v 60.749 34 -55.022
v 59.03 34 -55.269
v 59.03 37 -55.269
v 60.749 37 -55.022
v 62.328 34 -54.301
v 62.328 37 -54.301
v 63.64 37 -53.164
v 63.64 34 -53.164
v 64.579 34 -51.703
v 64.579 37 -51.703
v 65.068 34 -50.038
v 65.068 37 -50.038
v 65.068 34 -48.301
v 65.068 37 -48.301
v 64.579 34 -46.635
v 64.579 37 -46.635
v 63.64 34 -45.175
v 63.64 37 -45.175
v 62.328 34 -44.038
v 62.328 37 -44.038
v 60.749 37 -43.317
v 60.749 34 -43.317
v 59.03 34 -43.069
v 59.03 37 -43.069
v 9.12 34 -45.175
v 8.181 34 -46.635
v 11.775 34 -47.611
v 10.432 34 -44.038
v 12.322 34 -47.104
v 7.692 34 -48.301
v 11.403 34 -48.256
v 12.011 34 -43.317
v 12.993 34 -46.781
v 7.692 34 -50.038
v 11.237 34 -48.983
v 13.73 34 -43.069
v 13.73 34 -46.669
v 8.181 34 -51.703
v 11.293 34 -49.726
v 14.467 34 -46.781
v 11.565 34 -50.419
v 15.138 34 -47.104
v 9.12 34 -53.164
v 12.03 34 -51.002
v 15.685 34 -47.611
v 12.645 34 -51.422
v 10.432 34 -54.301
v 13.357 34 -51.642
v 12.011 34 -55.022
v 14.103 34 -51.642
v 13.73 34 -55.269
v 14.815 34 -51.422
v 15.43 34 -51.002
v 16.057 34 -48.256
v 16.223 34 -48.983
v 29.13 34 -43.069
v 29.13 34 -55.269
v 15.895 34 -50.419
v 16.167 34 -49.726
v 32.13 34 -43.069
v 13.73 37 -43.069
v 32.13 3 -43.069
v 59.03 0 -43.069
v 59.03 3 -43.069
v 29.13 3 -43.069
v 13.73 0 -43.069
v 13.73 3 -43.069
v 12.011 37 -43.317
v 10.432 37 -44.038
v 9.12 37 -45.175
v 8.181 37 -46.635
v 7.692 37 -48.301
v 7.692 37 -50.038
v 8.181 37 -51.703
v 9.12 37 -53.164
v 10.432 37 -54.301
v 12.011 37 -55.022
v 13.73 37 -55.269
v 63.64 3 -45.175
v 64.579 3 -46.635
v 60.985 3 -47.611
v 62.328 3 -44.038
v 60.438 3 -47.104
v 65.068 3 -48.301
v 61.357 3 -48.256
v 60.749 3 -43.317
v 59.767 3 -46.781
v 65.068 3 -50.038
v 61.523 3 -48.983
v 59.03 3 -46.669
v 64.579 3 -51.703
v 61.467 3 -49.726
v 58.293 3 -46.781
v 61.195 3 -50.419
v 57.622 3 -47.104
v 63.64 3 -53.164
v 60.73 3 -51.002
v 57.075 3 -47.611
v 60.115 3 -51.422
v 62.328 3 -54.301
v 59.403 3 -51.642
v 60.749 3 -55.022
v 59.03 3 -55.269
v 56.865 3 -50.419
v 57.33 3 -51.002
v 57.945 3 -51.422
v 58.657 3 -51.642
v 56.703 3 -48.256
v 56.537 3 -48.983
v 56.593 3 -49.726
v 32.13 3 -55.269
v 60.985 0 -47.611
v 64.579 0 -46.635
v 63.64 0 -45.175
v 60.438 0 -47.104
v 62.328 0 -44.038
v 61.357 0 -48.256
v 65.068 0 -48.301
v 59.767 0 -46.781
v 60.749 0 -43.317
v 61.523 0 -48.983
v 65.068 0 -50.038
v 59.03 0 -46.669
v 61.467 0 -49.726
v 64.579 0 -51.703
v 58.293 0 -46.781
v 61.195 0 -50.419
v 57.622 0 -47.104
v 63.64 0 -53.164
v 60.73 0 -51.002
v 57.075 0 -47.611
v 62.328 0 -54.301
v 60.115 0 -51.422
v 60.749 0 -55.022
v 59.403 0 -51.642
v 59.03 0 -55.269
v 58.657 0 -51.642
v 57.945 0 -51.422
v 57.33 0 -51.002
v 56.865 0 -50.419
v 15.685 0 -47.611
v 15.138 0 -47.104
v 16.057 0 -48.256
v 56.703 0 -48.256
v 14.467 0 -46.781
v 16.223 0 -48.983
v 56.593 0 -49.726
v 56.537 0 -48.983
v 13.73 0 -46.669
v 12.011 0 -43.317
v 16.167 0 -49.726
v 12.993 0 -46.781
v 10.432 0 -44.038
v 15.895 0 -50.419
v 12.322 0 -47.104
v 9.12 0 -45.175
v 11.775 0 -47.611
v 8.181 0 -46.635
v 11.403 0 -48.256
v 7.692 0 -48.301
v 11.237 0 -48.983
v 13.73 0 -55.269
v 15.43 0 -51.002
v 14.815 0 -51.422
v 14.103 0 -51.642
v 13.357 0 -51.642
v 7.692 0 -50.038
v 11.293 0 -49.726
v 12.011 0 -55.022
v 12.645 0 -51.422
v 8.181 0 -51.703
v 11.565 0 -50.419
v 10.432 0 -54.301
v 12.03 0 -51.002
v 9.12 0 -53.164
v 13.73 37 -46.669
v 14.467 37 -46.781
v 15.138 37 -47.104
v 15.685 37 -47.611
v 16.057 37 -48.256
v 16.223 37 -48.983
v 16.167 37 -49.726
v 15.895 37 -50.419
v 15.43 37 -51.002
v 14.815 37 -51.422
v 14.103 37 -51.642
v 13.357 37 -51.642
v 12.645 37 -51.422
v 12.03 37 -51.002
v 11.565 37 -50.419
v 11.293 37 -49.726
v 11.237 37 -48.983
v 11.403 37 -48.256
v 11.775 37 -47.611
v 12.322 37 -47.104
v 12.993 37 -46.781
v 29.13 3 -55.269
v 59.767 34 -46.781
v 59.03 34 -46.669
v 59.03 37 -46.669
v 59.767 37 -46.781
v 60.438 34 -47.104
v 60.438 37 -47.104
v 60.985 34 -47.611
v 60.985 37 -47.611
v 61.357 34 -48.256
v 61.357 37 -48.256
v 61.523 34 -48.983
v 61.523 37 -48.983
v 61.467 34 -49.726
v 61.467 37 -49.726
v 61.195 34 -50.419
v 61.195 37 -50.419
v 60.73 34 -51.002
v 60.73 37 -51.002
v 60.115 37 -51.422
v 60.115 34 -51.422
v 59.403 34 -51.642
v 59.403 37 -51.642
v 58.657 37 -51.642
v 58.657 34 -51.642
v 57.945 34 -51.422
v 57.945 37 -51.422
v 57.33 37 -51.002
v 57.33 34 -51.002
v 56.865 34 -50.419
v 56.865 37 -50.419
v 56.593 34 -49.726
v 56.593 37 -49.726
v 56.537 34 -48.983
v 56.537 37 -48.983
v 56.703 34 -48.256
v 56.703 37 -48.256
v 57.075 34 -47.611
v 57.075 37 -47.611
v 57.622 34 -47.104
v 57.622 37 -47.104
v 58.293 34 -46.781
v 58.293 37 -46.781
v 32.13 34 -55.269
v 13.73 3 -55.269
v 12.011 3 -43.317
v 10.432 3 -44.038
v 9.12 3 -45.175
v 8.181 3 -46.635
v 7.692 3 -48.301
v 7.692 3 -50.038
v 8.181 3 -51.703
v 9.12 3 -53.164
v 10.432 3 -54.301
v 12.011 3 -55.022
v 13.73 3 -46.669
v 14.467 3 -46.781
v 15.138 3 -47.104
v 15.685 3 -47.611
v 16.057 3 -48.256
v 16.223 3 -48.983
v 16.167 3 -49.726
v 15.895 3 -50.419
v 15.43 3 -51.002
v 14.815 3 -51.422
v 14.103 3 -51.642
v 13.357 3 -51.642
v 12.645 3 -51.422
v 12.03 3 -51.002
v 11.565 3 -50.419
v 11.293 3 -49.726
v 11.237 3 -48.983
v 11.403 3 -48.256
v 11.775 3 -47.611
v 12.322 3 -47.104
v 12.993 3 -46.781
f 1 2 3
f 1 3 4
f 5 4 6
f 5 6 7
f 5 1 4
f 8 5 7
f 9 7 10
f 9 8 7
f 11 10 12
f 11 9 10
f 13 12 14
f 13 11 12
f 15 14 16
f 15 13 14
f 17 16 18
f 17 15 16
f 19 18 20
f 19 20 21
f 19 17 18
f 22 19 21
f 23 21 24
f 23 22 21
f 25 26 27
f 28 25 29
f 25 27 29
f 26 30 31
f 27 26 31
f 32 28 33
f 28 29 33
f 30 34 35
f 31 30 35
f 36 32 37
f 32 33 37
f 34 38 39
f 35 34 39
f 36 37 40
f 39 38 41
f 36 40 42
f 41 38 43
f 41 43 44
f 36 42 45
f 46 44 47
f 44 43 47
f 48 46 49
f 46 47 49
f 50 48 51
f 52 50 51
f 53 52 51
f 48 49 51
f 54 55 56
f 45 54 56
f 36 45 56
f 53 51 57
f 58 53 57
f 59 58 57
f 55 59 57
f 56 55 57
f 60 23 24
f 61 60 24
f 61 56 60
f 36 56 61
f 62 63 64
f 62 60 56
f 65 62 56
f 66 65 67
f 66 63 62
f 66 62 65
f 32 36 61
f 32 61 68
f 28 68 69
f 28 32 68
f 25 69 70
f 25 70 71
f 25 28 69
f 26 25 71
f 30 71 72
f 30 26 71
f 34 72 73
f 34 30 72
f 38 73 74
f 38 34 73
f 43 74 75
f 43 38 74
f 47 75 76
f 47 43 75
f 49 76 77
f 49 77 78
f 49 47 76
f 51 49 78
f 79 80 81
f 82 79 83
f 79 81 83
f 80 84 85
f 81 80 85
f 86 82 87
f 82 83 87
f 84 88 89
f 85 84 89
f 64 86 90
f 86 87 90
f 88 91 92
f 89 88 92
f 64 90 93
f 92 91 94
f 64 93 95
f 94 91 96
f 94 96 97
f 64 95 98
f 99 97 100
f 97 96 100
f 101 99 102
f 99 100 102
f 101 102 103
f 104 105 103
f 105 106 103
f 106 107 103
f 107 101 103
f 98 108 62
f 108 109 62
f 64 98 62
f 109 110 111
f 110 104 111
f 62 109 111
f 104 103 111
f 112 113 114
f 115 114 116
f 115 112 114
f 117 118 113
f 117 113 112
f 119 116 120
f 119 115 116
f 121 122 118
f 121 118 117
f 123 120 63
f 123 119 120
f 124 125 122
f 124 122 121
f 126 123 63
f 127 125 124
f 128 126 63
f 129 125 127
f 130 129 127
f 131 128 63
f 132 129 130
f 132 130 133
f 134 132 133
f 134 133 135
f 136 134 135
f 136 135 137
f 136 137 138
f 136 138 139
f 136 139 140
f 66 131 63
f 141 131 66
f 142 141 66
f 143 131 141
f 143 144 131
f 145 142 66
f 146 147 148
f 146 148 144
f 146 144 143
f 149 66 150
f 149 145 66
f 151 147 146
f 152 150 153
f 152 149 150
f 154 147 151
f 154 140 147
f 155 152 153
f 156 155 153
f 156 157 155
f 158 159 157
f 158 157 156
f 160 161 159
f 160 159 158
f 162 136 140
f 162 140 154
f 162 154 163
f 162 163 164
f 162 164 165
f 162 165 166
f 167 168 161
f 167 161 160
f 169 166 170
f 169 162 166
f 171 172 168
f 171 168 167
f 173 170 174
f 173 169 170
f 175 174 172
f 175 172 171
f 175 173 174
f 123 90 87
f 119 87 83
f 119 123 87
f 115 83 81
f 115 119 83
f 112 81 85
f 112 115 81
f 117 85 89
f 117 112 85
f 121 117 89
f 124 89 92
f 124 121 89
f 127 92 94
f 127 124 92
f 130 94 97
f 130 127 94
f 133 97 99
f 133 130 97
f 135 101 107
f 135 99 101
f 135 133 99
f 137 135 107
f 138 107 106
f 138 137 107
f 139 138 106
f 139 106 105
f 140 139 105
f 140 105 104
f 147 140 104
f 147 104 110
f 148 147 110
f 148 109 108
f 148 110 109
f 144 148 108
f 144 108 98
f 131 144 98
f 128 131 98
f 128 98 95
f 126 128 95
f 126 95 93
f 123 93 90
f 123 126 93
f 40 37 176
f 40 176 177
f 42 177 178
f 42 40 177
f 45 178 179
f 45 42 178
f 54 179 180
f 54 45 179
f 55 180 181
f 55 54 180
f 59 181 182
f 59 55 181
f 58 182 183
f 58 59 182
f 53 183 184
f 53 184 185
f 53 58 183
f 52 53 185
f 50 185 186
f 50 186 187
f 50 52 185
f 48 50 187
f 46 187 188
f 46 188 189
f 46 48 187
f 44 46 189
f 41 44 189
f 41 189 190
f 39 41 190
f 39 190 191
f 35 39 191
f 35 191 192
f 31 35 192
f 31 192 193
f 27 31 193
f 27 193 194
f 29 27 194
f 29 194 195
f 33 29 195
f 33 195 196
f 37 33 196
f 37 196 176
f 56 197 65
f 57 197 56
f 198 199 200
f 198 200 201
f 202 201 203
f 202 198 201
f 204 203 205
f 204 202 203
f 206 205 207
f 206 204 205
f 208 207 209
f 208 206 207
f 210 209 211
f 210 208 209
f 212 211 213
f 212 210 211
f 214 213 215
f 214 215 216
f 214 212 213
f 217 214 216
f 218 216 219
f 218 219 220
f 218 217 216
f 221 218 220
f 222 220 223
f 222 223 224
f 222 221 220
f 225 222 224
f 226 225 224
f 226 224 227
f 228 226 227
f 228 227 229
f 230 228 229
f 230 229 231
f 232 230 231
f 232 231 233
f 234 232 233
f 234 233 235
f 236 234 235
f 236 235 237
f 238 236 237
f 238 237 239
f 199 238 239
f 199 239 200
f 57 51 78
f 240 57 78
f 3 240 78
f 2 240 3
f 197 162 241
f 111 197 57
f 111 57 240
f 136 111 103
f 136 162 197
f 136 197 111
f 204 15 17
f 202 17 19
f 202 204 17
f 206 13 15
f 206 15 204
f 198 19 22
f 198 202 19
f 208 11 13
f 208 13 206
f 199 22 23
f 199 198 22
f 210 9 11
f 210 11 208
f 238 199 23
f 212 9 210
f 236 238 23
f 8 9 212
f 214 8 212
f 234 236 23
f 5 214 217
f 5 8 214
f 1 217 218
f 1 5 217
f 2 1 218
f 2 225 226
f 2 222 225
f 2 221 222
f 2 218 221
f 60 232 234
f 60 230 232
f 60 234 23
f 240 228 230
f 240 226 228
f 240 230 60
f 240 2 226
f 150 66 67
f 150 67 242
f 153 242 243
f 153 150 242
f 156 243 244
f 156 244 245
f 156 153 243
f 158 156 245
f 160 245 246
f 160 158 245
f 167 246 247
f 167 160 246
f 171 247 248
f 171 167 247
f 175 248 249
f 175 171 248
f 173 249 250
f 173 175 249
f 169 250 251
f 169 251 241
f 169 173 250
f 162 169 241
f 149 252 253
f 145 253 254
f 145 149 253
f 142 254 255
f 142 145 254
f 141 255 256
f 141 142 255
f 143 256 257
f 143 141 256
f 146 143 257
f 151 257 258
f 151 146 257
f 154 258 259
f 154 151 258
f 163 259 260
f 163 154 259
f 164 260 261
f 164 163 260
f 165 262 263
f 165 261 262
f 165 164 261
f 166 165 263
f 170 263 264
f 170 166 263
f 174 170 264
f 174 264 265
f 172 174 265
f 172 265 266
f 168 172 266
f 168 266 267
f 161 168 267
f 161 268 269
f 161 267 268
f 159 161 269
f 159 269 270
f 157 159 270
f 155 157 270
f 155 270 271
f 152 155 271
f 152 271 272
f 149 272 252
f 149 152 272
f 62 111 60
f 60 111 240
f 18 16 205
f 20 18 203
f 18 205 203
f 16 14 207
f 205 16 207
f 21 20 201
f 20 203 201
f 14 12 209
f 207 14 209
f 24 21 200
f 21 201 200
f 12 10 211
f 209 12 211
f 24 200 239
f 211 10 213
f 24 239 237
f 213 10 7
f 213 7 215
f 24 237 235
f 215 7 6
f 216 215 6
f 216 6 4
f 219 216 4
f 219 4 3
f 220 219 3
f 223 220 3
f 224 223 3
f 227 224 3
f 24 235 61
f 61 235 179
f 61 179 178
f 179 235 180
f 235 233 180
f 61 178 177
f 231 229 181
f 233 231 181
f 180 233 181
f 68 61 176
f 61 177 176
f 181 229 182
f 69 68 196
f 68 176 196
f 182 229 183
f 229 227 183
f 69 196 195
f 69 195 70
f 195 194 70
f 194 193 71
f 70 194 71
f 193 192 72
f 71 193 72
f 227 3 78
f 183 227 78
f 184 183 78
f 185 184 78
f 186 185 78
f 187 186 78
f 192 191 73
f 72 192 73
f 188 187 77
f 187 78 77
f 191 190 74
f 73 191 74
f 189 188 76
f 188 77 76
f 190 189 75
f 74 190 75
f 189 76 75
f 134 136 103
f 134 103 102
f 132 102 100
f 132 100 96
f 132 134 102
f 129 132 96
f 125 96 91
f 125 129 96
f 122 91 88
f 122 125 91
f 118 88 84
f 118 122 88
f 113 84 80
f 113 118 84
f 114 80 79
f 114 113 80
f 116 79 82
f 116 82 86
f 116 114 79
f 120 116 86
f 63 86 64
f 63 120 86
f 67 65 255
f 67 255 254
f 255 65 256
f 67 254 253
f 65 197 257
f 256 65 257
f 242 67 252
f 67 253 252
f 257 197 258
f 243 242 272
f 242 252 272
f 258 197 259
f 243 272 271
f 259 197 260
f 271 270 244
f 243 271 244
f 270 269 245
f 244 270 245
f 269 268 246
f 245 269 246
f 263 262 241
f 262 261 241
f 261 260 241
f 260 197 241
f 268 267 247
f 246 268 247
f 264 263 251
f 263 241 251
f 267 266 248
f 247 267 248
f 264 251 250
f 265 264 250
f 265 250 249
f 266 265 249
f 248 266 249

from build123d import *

# Parameters (mm, degrees)
SKETCH7_R           = 2.5
BOSS_EXTRUDE3_DEPTH = 37
SKETCH8_W           = 15.4
SKETCH8_H           = 31
SKETCH8_W_2         = 8.010366446
SKETCH8_W_3         = 36.155804789
CUT_EXTRUDE4_DEPTH  = 76.893008599


with BuildPart() as part:
    # Sketch7 → Boss-Extrude3 (new body)
    with BuildSketch(Plane(origin=(0, 0, 0), x_dir=(1, 0, 0), z_dir=(0, 1, 0))):
        with BuildLine():
            Line((13.729937465, 55.269451431), (59.029937465, 55.269451431))
            ThreePointArc((59.029937465, 55.269451431), (65.129937465, 49.169451431), (59.029937465, 43.069451431))
            Line((59.029937465, 43.069451431), (13.729937465, 43.069451431))
            ThreePointArc((13.729937465, 43.069451431), (7.629937465, 49.169451431), (13.729937465, 55.269451431))
        make_face()
        with Locations(Location((13.729937465, 49.169451431, 0), (0, 0, 270))):
            Circle(SKETCH7_R, mode=Mode.SUBTRACT)
        with Locations(Location((59.029937465, 49.169451431, 0), (0, 0, 270))):
            Circle(SKETCH7_R, mode=Mode.SUBTRACT)
    extrude(amount=BOSS_EXTRUDE3_DEPTH)

    # Sketch8 → Cut-Extrude4 (cut, through all)
    with BuildSketch(Plane(origin=(0, 0, -55.269451431), x_dir=(-1, 0, 0), z_dir=(0, 0, -1))):
        with Locations((-21.429937465, 18.5)):
            Rectangle(SKETCH8_W, SKETCH8_H)
        with Locations((-9.724754242, 18.5)):
            Rectangle(SKETCH8_W_2, SKETCH8_H)
        with Locations((-50.207839859, 18.5)):
            Rectangle(SKETCH8_W_3, SKETCH8_H)
    extrude(amount=-CUT_EXTRUDE4_DEPTH, mode=Mode.SUBTRACT)


solid = part.part
